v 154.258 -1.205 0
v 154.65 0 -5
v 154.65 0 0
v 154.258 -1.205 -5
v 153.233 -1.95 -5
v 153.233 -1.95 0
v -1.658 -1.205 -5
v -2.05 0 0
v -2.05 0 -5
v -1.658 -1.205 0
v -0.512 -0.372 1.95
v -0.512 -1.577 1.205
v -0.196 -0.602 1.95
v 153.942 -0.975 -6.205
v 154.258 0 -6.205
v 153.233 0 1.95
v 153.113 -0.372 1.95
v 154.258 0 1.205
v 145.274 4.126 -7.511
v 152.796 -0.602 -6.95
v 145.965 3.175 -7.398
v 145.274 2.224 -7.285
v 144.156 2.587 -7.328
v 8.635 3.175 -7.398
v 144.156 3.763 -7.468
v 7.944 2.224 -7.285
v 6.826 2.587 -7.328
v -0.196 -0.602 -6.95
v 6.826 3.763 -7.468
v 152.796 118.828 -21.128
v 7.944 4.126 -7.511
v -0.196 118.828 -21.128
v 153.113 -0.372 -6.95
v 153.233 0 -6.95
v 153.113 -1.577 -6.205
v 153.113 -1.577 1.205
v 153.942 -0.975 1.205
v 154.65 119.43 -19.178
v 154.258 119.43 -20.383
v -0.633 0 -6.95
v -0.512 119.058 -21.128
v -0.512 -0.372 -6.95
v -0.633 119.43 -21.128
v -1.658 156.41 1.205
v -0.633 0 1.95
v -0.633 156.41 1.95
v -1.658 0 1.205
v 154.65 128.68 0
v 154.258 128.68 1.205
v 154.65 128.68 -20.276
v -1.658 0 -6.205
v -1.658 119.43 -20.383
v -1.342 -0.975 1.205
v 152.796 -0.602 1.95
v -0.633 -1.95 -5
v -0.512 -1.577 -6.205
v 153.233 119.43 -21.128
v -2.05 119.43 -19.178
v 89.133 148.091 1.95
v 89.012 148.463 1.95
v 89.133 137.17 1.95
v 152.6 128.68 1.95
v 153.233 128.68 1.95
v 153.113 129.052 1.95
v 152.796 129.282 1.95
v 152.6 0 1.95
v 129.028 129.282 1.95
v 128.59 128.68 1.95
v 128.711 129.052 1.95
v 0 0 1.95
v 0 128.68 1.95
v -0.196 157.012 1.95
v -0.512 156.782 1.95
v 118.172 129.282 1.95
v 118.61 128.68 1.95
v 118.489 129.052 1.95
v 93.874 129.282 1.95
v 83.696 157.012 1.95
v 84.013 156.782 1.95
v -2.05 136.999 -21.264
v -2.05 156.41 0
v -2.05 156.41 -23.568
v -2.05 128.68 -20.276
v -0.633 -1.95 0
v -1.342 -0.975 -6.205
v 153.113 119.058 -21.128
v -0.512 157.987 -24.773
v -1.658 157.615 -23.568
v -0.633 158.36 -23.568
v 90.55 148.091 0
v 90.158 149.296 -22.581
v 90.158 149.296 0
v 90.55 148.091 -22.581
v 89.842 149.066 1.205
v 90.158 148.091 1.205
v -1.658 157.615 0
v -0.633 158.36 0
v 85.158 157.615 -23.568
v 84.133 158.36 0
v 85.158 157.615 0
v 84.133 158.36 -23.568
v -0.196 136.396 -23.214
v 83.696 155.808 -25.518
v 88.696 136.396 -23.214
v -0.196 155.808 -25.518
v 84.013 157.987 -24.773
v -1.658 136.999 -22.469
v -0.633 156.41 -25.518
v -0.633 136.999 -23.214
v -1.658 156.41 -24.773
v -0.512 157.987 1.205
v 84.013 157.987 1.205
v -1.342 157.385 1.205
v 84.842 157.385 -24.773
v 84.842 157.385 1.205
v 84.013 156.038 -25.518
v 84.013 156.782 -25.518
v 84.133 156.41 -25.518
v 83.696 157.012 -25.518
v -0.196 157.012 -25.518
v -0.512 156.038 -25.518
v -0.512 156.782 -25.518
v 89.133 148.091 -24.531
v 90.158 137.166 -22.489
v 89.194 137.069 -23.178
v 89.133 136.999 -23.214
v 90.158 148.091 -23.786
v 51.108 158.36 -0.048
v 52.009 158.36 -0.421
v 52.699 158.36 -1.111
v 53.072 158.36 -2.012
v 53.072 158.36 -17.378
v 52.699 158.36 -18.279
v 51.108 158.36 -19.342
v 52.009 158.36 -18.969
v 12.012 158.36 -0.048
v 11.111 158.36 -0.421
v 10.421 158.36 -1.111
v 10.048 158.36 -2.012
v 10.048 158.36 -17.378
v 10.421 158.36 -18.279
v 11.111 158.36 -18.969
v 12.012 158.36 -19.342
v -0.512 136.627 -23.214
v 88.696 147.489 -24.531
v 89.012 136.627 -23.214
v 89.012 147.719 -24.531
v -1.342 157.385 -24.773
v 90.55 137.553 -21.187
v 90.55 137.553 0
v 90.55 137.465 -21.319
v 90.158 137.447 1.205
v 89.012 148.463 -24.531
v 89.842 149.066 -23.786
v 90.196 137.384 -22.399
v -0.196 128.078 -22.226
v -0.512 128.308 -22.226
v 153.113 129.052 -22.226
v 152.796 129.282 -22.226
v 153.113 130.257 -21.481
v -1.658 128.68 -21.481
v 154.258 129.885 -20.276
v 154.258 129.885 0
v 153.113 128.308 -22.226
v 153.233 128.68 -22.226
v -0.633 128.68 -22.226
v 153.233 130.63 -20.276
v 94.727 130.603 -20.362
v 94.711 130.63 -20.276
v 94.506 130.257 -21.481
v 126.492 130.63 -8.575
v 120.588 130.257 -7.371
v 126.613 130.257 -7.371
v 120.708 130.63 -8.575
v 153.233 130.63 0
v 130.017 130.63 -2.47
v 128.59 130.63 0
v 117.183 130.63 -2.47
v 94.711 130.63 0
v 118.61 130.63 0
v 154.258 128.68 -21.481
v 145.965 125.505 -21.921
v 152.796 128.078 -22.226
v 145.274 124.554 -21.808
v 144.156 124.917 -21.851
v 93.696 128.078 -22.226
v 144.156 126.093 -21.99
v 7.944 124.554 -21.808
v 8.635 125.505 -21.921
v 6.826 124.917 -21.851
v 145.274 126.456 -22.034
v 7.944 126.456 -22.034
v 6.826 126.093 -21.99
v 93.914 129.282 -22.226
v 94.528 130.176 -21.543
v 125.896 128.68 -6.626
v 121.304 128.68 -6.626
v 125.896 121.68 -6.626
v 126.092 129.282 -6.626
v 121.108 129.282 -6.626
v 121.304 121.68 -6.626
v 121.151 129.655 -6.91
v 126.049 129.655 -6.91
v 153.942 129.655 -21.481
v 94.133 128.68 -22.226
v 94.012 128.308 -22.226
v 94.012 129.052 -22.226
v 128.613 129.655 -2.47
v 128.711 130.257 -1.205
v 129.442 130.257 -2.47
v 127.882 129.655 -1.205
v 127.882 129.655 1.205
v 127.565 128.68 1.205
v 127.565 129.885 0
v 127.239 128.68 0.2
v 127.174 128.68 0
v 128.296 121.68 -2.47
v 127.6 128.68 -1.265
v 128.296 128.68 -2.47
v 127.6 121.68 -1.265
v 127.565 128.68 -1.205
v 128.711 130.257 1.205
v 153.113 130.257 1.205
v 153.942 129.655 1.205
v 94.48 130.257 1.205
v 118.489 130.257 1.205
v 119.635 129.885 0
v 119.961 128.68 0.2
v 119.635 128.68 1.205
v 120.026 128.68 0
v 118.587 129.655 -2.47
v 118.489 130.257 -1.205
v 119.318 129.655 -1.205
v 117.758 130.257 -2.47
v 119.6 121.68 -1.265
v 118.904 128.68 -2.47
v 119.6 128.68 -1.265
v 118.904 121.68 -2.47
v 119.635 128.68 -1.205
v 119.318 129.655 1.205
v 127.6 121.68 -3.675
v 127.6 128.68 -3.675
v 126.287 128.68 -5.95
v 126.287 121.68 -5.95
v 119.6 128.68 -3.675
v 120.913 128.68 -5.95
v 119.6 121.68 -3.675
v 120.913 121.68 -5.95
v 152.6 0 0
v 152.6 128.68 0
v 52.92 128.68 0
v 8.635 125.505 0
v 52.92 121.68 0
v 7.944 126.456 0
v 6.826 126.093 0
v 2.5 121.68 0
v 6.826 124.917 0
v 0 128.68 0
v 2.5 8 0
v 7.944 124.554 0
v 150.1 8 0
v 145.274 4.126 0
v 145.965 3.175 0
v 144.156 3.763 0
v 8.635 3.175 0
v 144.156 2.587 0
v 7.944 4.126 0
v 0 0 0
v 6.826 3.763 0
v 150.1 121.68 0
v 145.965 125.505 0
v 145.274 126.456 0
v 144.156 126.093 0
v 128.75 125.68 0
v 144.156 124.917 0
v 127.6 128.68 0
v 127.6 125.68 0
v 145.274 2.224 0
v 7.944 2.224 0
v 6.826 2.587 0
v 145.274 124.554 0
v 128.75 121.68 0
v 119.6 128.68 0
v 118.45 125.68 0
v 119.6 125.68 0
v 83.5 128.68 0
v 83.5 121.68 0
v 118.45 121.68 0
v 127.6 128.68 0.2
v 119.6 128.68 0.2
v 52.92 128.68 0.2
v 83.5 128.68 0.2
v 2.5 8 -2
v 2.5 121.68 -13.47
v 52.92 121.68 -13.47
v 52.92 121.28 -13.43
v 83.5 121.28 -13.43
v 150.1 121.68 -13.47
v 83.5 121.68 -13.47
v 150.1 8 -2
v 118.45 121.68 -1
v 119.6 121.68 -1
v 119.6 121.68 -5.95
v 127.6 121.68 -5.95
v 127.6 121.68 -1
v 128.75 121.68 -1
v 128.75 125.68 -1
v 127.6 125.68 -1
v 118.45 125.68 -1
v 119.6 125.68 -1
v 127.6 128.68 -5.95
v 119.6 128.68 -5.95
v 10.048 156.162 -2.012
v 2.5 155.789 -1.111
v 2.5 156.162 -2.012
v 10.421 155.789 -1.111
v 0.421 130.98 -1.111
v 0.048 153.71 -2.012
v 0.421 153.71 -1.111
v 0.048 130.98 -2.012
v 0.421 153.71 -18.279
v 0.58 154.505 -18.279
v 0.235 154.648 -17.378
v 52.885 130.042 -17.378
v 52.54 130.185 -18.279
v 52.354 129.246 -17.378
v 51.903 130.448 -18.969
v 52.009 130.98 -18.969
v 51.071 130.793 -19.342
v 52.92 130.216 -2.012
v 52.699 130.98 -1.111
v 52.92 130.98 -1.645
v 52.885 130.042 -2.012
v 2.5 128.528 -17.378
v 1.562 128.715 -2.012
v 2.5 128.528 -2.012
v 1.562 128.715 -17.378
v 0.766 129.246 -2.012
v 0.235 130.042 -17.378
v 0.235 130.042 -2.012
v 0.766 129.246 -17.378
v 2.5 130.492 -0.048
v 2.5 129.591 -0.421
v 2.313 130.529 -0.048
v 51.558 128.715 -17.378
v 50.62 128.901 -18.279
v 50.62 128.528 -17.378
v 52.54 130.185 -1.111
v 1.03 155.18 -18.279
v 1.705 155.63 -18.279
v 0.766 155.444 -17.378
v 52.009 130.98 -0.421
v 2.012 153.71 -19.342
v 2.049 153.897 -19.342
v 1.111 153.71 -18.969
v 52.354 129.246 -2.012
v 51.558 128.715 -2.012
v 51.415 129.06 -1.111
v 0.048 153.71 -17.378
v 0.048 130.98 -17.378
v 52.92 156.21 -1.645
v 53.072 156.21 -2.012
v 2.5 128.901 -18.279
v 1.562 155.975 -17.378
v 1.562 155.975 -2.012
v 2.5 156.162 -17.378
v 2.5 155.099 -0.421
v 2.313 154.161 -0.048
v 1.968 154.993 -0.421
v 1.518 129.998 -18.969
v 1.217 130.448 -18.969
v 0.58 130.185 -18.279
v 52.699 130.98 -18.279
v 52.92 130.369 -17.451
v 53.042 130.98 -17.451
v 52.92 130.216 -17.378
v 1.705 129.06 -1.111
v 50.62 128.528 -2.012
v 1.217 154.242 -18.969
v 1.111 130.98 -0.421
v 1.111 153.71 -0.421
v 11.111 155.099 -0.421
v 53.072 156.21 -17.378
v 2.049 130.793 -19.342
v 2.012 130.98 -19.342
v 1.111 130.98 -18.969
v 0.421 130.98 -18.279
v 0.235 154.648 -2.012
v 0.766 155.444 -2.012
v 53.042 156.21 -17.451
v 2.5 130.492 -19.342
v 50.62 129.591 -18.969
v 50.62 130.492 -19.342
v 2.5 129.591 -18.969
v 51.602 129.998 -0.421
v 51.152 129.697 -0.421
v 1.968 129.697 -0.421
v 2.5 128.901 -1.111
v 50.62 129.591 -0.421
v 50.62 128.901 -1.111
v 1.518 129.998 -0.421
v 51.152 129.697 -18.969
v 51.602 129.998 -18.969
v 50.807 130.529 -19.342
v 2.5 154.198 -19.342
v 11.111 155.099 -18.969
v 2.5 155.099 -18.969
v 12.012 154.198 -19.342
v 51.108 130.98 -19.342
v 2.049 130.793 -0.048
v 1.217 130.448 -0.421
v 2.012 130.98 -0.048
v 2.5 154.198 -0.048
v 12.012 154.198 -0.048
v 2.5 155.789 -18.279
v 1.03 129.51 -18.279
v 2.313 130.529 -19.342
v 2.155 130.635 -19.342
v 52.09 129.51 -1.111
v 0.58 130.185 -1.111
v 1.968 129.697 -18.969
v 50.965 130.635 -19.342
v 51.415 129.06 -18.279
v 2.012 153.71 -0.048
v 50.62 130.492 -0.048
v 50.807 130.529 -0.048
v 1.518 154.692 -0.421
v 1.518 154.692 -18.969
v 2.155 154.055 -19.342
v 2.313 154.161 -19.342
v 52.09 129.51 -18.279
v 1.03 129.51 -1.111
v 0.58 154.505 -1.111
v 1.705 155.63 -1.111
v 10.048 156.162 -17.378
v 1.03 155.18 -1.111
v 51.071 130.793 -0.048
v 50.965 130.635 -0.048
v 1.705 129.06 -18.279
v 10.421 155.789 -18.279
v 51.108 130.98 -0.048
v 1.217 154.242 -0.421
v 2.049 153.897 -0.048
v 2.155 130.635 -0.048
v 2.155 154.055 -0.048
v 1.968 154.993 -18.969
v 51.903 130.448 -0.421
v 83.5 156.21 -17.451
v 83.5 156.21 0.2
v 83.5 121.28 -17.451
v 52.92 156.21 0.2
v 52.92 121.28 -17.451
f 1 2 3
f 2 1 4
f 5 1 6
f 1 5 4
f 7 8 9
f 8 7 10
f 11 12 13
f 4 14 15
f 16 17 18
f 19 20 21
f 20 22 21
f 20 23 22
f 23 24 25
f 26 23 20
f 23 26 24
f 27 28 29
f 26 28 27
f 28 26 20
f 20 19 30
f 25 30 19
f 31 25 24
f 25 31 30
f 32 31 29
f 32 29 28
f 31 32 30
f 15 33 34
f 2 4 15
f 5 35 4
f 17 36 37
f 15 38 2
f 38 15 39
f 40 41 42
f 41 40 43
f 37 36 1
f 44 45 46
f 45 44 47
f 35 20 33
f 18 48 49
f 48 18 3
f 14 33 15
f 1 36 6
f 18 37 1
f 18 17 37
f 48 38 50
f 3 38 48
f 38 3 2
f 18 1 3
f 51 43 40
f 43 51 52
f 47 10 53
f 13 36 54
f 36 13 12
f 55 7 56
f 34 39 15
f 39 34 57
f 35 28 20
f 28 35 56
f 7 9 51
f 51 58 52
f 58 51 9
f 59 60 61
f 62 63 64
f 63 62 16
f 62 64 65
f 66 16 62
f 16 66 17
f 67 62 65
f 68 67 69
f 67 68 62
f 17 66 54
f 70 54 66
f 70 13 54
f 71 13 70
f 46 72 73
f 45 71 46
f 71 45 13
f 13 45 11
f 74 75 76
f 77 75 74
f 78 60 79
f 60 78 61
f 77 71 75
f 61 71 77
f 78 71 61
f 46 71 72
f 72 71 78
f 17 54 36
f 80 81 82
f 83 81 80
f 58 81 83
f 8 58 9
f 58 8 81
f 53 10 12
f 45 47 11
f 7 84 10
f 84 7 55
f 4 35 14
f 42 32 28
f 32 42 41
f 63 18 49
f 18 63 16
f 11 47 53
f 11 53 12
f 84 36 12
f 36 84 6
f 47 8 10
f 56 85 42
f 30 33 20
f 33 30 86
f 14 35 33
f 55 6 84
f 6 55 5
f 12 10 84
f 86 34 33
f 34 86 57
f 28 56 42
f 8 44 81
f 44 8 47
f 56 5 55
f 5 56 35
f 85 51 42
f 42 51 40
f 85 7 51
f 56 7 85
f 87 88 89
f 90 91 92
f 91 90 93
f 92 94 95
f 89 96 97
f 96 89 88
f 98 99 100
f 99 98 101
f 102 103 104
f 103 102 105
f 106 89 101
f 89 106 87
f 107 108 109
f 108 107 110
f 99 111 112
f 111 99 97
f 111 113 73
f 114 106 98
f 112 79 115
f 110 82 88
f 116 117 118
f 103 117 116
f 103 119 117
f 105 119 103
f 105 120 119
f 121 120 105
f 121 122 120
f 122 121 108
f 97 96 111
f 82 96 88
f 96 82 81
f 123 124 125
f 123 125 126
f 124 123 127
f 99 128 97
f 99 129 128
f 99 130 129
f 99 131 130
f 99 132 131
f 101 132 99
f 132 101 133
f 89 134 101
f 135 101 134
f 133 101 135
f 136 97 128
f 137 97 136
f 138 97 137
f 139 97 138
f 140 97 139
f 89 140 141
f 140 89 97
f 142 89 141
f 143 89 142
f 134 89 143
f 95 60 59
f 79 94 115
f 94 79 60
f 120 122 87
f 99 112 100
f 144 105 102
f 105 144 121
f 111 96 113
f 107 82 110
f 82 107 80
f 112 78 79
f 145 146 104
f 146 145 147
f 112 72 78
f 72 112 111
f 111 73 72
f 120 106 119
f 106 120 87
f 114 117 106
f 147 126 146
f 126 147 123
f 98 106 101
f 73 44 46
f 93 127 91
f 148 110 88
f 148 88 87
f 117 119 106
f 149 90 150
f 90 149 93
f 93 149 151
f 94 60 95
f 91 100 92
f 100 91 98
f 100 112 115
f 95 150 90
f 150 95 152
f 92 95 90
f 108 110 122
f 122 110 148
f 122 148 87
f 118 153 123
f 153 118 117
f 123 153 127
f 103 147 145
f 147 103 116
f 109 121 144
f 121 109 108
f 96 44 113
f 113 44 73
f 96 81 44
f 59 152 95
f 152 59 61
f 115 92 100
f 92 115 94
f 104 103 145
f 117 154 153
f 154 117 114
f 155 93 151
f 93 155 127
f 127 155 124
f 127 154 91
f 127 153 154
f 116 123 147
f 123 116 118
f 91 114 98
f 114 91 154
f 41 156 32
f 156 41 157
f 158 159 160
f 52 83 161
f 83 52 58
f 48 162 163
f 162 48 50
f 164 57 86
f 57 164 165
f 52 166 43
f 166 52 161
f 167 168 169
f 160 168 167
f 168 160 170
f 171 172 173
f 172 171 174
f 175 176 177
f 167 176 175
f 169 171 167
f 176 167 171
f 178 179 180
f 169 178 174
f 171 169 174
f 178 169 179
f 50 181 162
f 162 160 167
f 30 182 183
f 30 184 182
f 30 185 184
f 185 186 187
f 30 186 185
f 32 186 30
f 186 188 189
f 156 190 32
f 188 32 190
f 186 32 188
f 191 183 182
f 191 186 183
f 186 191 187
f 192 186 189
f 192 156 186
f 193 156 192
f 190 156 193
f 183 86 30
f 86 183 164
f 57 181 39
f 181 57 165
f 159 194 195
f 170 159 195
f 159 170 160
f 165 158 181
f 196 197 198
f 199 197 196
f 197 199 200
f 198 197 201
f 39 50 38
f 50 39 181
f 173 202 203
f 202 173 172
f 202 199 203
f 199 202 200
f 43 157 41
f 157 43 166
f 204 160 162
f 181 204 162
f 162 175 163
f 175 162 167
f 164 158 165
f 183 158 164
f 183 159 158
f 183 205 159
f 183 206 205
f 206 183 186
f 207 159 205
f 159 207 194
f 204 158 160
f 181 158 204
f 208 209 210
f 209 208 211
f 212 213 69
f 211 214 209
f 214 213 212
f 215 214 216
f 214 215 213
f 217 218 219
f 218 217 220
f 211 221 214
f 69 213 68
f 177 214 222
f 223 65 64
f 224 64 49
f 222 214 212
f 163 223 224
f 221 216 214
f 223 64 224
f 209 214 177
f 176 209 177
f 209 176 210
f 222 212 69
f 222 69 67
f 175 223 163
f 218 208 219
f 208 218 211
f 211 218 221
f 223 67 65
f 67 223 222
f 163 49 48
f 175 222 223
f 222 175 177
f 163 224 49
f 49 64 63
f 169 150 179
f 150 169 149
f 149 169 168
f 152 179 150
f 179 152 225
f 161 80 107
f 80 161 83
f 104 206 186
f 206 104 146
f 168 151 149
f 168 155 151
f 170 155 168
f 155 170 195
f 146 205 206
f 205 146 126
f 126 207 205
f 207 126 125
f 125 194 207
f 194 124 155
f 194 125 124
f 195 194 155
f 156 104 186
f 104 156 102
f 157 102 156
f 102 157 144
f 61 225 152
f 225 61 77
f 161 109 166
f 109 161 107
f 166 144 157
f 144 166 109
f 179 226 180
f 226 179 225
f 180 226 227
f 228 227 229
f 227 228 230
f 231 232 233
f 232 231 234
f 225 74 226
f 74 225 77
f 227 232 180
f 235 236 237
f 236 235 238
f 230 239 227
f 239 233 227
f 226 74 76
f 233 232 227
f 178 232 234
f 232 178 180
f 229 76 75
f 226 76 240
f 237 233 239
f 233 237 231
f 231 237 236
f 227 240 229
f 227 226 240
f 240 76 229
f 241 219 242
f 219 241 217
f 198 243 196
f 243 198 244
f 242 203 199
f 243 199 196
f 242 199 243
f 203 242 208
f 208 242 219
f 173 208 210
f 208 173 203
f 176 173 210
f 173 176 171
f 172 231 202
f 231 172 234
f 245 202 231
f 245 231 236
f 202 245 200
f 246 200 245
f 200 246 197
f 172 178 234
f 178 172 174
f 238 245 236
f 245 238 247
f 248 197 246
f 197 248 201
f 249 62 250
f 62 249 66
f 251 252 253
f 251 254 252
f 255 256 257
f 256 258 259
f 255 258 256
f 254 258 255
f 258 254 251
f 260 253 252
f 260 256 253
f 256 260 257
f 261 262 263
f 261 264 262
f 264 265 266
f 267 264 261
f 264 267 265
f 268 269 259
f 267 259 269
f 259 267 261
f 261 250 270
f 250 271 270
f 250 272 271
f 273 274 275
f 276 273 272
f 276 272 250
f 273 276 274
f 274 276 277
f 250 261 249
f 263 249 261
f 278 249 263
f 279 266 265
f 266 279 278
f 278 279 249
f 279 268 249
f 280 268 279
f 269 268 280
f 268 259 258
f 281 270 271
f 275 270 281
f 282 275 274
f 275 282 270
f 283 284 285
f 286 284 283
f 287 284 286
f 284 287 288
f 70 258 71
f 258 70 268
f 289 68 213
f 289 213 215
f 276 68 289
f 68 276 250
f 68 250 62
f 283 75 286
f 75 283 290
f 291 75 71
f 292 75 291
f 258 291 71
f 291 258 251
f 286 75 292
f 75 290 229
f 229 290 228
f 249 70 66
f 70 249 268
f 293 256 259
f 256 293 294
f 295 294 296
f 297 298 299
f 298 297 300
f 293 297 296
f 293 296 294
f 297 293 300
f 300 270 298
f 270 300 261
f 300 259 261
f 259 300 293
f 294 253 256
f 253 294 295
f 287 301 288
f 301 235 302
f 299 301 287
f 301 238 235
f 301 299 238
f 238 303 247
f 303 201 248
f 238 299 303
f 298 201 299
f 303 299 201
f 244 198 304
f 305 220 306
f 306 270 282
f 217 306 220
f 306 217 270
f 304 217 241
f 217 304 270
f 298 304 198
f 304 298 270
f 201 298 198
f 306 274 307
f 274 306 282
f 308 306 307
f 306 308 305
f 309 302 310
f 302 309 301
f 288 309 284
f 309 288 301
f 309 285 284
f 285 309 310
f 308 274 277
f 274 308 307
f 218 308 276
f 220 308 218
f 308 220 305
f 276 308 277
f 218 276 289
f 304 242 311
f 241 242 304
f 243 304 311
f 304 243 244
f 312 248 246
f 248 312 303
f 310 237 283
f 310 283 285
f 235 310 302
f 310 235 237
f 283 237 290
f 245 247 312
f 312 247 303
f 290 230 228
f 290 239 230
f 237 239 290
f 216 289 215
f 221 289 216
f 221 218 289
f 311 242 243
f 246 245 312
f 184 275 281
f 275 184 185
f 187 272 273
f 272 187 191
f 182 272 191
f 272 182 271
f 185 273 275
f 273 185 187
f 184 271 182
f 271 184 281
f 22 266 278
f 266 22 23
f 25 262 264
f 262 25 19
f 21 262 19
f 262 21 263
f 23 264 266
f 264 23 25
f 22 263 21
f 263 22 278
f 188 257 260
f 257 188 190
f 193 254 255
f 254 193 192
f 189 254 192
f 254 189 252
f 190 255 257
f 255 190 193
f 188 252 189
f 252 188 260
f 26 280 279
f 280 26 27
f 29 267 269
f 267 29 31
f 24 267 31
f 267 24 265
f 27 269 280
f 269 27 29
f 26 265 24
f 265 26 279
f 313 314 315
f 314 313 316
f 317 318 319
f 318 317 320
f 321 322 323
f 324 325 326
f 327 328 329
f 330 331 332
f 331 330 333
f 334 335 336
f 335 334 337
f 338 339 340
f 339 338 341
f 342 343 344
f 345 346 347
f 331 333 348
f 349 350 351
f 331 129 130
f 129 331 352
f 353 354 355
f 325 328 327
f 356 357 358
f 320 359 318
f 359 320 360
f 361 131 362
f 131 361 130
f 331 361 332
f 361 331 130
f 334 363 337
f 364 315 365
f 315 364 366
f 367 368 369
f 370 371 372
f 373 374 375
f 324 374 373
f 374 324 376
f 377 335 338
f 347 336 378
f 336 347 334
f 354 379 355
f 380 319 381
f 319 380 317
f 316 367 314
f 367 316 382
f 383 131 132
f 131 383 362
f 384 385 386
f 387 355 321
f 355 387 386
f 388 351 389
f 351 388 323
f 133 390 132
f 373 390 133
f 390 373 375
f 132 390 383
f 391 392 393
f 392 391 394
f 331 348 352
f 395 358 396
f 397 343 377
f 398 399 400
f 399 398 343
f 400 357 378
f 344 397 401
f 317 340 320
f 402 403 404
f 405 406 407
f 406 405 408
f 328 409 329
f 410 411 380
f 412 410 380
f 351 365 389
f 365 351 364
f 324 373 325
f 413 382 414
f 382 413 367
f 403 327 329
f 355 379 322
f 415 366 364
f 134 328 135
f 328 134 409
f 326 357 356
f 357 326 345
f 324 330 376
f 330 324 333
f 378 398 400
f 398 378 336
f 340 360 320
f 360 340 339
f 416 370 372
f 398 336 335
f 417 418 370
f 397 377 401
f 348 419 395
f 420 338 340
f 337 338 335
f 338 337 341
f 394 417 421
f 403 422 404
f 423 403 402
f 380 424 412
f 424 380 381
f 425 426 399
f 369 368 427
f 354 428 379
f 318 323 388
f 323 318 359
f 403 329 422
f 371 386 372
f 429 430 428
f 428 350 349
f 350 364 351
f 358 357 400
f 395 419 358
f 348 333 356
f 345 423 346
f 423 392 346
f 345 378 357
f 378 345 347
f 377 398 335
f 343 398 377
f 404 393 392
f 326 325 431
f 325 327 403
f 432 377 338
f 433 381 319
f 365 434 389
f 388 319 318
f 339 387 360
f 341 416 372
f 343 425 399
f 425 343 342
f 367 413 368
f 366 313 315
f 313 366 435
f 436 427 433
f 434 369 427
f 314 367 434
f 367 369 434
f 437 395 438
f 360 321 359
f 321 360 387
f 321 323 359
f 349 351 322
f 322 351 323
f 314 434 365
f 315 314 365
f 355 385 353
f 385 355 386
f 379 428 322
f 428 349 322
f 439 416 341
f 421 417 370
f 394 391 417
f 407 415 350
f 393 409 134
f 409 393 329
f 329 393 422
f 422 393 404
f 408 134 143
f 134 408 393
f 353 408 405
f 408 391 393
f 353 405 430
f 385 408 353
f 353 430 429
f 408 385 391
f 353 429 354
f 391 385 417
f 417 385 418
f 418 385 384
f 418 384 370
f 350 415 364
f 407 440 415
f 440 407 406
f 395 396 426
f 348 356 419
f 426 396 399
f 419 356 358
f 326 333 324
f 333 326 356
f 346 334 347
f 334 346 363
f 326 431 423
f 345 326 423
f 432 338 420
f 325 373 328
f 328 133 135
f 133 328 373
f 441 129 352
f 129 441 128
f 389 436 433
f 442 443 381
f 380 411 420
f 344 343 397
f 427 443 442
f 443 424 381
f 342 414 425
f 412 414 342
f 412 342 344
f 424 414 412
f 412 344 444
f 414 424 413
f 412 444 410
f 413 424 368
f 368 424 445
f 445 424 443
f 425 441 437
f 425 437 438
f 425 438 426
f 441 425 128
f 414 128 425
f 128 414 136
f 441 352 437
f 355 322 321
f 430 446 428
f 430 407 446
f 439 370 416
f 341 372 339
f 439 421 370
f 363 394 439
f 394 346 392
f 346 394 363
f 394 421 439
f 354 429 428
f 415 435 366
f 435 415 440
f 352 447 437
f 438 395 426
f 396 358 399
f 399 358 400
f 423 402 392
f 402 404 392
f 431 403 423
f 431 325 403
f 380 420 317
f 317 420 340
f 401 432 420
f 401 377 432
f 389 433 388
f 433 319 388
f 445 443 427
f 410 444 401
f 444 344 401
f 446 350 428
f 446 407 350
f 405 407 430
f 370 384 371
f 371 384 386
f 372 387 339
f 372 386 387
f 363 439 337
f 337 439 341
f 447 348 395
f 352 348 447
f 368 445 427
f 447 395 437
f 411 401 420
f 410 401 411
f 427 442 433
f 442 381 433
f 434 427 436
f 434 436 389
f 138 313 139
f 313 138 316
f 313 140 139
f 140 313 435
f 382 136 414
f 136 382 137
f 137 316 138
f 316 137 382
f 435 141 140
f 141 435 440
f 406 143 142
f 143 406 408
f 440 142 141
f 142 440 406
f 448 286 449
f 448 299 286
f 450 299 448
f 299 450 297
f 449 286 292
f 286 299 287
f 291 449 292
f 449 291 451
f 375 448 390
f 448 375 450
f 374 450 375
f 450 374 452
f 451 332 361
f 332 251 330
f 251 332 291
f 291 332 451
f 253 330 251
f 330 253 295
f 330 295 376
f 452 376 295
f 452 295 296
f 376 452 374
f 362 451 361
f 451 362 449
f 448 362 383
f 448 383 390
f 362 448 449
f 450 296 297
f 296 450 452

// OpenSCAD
// dimensions in mm

// options
open_back = false;
truncated = false;

// Eurorack constants
HP = 5.08;
U = 1.25 * 25.4;

// measured
// "protrusion" means component height perpendicular to back of board
m_panel_width = 152.46;
m_panel_height = 128.48;
m_hole_width = 137.33;
m_hole_height = 122.33;
echo("hp panel", m_panel_width / HP, m_panel_height / U);
echo("hp hole", m_hole_width / HP, m_hole_height / U);
m_board_thick = 2.05;
m_max_thick = 13.52;
m_max_protrusion = m_max_thick - m_board_thick;
m_clearance_leftright = 2.5;
m_clearance_bottom = 8;
m_clearance_top = 7;
m_clearance_top_jack_leads = 3;  // how far in from edge you can go before hitting a lead
m_edge_to_bat_jack_far_edge = 83.5;  // includes SMD lead footprint area
m_right_edge_to_output_jack_center = 29.0;
m_top_to_output_jack_center = 4.52;
m_output_jack_smd_width = 10.3;  // includes SMD lead footprint area
m_output_jack_body_width = 8;  // includes SMD lead footprint area
m_output_jack_protrusion = 8 - m_board_thick;
m_mounting_hole_diameter = 3.19;

// 9v battery compartment dimensions
bat_width = 53.12 /* measured with extra for snap */;
bat_frontback = 25.73 /* measured */ + 2 /* slop */;
bat_thick = 17.39 /* measured */ + 2 /* slop */;
bat_radius = 2.5;

// chosen parameters
panel_tolerance = 0.1;
output_jack_clearance_dia = 10.0;
epsilon = 0.2;
extra_component_clearance = 2;
smd_lead_protrusion = 1;  // space to allow for thickness of smd leads above board
screw_diameter = 1;
screw_min_length = 5;

// derived parameters
used_panel_width = 30 * HP + panel_tolerance * 2;
used_panel_height = m_panel_height + panel_tolerance * 2;
case_wall_thick = m_board_thick;

module screw_hole() {
    // TODO: pick screw hole diameter -- is not the same as Hyve holes unless we decide to go for a bolt & nut instead of screwing into plastic
    translate([0, 0, -30])
    cylinder(r=screw_diameter, h=999);
}

module slant_box(dx, dy, dz1, dz2) {
    rotate([0, 90, 0])
    linear_extrude(height=dx, center=false)
    polygon([[0, 0], [0, dy], [-dz2, dy], [-dz1, 0]]);
}

module rounded_box(r, xyz) {
    translate([r, r, r])
    minkowski() {
        // TODO: An octahedron would be more useful and accurate, because sphere() does not extend fully to top/bottom ends
        sphere(r=r, $fn=16);
        cube([xyz[0] - r*2, xyz[1] - r*2, xyz[2] - r*2]);
    }
}
            
difference() {
    color("gray")
    minkowski() {
        sphere(r=case_wall_thick, $fn=10);
        difference() {
            // main body shape
            translate([0, 0, 0])
            slant_box(
                dx=used_panel_width,
                dy=used_panel_height + bat_frontback,
                dz1=-screw_min_length,
                // ratio adjustment prevents slope from cutting off battery compartment entry
                dz2=-bat_thick * ((used_panel_height + bat_frontback) / used_panel_height));
            
            if (truncated) {
                translate([-epsilon, -epsilon, -500])
                cube([999, used_panel_height * 0.9, 1000]);
            }
            
            // remove material around non-battery edge, decoratively
            xstep = 5;
            ydist = bat_frontback;
            translate([
                m_edge_to_bat_jack_far_edge,
                used_panel_height,
                0])
            linear_extrude(height=999, center=true)
            polygon([
                [-999, 999],  // left end dummy point
                [xstep * 0, ydist * 1.0],
                [xstep * 1, ydist * 0.7],
                [xstep * 1, ydist * 0.3], 
                [xstep * 2, ydist * 0], 
                [used_panel_width + epsilon, 0],
                [999, 0]  // right end dummy point
            ]);
            
            // subtract output jack hole to make nice rounded area
            translate([
                used_panel_width - m_right_edge_to_output_jack_center,
                used_panel_height - m_clearance_top - case_wall_thick - epsilon,
                m_board_thick - m_top_to_output_jack_center])
            rotate([-90, 0, 0])
            cylinder(r=output_jack_clearance_dia / 2 + case_wall_thick, h=999, $fn=6);
        }
    }
     
    color("RoyalBlue")
    union() {
        // cutout for board
        cube([used_panel_width, used_panel_height, 999]);
        
        // cutout for components
        translate([
            m_clearance_leftright,
            m_clearance_bottom,
            epsilon
        ])
        scale([1, 1, open_back ? 10 : 1])  // just punch through if option is set
        slant_box(
            dx=used_panel_width - m_clearance_leftright * 2,
            dy=used_panel_height - m_clearance_bottom - m_clearance_top,
            dz1=-(epsilon + extra_component_clearance + 0),
            dz2=-(epsilon + extra_component_clearance + m_max_protrusion)
        );
    }
    
    // battery compartment interior volume
    color("Green")
    translate([0, m_panel_height, -bat_thick])
    //cube([bat_width, bat_frontback, bat_thick]);
    rounded_box(r=bat_radius, xyz=[bat_width, bat_frontback, bat_thick]);
    
    // battery compartment opening
    translate([10, m_panel_height + bat_frontback - bat_radius * 2 - epsilon, -bat_thick])
    rounded_box(r=bat_radius, xyz=[bat_width - 10, 99, bat_thick]);
    
    // battery compartment wiring passage
    color("Goldenrod")
    translate([
        bat_width - epsilon,
        m_panel_height - m_clearance_top - epsilon,
        -bat_thick*0.9])
    cube([
        m_edge_to_bat_jack_far_edge - bat_width + epsilon,
        bat_frontback + m_clearance_top + epsilon,
        bat_thick*0.9 + epsilon]);
    
    // output jack clearance
    translate([
        used_panel_width - m_right_edge_to_output_jack_center,
        used_panel_height,
        0])
    union() {
        // SMD footprint
        translate([
            -m_output_jack_smd_width / 2,
            -m_clearance_top - epsilon,
            -smd_lead_protrusion])
        cube([
            m_output_jack_smd_width,
            m_clearance_top - m_clearance_top_jack_leads + epsilon,
            smd_lead_protrusion + epsilon]);
        // main body
        translate([
            - m_output_jack_body_width / 2,
            - m_clearance_top - epsilon,
            -m_output_jack_protrusion])
        cube([
            m_output_jack_body_width,
            m_clearance_top + epsilon,
            m_output_jack_protrusion + epsilon]);
    }
    
    // mounting screw holes
    translate([used_panel_width / 2, used_panel_height / 2, 0]) {
        translate([m_hole_width / 2, m_hole_height / 2, 0]) screw_hole();
        translate([m_hole_width / 2, -m_hole_height / 2, 0]) screw_hole();
        translate([-m_hole_width / 2, m_hole_height / 2, 0]) screw_hole();
        translate([-m_hole_width / 2, -m_hole_height / 2, 0]) screw_hole();
    }
};
